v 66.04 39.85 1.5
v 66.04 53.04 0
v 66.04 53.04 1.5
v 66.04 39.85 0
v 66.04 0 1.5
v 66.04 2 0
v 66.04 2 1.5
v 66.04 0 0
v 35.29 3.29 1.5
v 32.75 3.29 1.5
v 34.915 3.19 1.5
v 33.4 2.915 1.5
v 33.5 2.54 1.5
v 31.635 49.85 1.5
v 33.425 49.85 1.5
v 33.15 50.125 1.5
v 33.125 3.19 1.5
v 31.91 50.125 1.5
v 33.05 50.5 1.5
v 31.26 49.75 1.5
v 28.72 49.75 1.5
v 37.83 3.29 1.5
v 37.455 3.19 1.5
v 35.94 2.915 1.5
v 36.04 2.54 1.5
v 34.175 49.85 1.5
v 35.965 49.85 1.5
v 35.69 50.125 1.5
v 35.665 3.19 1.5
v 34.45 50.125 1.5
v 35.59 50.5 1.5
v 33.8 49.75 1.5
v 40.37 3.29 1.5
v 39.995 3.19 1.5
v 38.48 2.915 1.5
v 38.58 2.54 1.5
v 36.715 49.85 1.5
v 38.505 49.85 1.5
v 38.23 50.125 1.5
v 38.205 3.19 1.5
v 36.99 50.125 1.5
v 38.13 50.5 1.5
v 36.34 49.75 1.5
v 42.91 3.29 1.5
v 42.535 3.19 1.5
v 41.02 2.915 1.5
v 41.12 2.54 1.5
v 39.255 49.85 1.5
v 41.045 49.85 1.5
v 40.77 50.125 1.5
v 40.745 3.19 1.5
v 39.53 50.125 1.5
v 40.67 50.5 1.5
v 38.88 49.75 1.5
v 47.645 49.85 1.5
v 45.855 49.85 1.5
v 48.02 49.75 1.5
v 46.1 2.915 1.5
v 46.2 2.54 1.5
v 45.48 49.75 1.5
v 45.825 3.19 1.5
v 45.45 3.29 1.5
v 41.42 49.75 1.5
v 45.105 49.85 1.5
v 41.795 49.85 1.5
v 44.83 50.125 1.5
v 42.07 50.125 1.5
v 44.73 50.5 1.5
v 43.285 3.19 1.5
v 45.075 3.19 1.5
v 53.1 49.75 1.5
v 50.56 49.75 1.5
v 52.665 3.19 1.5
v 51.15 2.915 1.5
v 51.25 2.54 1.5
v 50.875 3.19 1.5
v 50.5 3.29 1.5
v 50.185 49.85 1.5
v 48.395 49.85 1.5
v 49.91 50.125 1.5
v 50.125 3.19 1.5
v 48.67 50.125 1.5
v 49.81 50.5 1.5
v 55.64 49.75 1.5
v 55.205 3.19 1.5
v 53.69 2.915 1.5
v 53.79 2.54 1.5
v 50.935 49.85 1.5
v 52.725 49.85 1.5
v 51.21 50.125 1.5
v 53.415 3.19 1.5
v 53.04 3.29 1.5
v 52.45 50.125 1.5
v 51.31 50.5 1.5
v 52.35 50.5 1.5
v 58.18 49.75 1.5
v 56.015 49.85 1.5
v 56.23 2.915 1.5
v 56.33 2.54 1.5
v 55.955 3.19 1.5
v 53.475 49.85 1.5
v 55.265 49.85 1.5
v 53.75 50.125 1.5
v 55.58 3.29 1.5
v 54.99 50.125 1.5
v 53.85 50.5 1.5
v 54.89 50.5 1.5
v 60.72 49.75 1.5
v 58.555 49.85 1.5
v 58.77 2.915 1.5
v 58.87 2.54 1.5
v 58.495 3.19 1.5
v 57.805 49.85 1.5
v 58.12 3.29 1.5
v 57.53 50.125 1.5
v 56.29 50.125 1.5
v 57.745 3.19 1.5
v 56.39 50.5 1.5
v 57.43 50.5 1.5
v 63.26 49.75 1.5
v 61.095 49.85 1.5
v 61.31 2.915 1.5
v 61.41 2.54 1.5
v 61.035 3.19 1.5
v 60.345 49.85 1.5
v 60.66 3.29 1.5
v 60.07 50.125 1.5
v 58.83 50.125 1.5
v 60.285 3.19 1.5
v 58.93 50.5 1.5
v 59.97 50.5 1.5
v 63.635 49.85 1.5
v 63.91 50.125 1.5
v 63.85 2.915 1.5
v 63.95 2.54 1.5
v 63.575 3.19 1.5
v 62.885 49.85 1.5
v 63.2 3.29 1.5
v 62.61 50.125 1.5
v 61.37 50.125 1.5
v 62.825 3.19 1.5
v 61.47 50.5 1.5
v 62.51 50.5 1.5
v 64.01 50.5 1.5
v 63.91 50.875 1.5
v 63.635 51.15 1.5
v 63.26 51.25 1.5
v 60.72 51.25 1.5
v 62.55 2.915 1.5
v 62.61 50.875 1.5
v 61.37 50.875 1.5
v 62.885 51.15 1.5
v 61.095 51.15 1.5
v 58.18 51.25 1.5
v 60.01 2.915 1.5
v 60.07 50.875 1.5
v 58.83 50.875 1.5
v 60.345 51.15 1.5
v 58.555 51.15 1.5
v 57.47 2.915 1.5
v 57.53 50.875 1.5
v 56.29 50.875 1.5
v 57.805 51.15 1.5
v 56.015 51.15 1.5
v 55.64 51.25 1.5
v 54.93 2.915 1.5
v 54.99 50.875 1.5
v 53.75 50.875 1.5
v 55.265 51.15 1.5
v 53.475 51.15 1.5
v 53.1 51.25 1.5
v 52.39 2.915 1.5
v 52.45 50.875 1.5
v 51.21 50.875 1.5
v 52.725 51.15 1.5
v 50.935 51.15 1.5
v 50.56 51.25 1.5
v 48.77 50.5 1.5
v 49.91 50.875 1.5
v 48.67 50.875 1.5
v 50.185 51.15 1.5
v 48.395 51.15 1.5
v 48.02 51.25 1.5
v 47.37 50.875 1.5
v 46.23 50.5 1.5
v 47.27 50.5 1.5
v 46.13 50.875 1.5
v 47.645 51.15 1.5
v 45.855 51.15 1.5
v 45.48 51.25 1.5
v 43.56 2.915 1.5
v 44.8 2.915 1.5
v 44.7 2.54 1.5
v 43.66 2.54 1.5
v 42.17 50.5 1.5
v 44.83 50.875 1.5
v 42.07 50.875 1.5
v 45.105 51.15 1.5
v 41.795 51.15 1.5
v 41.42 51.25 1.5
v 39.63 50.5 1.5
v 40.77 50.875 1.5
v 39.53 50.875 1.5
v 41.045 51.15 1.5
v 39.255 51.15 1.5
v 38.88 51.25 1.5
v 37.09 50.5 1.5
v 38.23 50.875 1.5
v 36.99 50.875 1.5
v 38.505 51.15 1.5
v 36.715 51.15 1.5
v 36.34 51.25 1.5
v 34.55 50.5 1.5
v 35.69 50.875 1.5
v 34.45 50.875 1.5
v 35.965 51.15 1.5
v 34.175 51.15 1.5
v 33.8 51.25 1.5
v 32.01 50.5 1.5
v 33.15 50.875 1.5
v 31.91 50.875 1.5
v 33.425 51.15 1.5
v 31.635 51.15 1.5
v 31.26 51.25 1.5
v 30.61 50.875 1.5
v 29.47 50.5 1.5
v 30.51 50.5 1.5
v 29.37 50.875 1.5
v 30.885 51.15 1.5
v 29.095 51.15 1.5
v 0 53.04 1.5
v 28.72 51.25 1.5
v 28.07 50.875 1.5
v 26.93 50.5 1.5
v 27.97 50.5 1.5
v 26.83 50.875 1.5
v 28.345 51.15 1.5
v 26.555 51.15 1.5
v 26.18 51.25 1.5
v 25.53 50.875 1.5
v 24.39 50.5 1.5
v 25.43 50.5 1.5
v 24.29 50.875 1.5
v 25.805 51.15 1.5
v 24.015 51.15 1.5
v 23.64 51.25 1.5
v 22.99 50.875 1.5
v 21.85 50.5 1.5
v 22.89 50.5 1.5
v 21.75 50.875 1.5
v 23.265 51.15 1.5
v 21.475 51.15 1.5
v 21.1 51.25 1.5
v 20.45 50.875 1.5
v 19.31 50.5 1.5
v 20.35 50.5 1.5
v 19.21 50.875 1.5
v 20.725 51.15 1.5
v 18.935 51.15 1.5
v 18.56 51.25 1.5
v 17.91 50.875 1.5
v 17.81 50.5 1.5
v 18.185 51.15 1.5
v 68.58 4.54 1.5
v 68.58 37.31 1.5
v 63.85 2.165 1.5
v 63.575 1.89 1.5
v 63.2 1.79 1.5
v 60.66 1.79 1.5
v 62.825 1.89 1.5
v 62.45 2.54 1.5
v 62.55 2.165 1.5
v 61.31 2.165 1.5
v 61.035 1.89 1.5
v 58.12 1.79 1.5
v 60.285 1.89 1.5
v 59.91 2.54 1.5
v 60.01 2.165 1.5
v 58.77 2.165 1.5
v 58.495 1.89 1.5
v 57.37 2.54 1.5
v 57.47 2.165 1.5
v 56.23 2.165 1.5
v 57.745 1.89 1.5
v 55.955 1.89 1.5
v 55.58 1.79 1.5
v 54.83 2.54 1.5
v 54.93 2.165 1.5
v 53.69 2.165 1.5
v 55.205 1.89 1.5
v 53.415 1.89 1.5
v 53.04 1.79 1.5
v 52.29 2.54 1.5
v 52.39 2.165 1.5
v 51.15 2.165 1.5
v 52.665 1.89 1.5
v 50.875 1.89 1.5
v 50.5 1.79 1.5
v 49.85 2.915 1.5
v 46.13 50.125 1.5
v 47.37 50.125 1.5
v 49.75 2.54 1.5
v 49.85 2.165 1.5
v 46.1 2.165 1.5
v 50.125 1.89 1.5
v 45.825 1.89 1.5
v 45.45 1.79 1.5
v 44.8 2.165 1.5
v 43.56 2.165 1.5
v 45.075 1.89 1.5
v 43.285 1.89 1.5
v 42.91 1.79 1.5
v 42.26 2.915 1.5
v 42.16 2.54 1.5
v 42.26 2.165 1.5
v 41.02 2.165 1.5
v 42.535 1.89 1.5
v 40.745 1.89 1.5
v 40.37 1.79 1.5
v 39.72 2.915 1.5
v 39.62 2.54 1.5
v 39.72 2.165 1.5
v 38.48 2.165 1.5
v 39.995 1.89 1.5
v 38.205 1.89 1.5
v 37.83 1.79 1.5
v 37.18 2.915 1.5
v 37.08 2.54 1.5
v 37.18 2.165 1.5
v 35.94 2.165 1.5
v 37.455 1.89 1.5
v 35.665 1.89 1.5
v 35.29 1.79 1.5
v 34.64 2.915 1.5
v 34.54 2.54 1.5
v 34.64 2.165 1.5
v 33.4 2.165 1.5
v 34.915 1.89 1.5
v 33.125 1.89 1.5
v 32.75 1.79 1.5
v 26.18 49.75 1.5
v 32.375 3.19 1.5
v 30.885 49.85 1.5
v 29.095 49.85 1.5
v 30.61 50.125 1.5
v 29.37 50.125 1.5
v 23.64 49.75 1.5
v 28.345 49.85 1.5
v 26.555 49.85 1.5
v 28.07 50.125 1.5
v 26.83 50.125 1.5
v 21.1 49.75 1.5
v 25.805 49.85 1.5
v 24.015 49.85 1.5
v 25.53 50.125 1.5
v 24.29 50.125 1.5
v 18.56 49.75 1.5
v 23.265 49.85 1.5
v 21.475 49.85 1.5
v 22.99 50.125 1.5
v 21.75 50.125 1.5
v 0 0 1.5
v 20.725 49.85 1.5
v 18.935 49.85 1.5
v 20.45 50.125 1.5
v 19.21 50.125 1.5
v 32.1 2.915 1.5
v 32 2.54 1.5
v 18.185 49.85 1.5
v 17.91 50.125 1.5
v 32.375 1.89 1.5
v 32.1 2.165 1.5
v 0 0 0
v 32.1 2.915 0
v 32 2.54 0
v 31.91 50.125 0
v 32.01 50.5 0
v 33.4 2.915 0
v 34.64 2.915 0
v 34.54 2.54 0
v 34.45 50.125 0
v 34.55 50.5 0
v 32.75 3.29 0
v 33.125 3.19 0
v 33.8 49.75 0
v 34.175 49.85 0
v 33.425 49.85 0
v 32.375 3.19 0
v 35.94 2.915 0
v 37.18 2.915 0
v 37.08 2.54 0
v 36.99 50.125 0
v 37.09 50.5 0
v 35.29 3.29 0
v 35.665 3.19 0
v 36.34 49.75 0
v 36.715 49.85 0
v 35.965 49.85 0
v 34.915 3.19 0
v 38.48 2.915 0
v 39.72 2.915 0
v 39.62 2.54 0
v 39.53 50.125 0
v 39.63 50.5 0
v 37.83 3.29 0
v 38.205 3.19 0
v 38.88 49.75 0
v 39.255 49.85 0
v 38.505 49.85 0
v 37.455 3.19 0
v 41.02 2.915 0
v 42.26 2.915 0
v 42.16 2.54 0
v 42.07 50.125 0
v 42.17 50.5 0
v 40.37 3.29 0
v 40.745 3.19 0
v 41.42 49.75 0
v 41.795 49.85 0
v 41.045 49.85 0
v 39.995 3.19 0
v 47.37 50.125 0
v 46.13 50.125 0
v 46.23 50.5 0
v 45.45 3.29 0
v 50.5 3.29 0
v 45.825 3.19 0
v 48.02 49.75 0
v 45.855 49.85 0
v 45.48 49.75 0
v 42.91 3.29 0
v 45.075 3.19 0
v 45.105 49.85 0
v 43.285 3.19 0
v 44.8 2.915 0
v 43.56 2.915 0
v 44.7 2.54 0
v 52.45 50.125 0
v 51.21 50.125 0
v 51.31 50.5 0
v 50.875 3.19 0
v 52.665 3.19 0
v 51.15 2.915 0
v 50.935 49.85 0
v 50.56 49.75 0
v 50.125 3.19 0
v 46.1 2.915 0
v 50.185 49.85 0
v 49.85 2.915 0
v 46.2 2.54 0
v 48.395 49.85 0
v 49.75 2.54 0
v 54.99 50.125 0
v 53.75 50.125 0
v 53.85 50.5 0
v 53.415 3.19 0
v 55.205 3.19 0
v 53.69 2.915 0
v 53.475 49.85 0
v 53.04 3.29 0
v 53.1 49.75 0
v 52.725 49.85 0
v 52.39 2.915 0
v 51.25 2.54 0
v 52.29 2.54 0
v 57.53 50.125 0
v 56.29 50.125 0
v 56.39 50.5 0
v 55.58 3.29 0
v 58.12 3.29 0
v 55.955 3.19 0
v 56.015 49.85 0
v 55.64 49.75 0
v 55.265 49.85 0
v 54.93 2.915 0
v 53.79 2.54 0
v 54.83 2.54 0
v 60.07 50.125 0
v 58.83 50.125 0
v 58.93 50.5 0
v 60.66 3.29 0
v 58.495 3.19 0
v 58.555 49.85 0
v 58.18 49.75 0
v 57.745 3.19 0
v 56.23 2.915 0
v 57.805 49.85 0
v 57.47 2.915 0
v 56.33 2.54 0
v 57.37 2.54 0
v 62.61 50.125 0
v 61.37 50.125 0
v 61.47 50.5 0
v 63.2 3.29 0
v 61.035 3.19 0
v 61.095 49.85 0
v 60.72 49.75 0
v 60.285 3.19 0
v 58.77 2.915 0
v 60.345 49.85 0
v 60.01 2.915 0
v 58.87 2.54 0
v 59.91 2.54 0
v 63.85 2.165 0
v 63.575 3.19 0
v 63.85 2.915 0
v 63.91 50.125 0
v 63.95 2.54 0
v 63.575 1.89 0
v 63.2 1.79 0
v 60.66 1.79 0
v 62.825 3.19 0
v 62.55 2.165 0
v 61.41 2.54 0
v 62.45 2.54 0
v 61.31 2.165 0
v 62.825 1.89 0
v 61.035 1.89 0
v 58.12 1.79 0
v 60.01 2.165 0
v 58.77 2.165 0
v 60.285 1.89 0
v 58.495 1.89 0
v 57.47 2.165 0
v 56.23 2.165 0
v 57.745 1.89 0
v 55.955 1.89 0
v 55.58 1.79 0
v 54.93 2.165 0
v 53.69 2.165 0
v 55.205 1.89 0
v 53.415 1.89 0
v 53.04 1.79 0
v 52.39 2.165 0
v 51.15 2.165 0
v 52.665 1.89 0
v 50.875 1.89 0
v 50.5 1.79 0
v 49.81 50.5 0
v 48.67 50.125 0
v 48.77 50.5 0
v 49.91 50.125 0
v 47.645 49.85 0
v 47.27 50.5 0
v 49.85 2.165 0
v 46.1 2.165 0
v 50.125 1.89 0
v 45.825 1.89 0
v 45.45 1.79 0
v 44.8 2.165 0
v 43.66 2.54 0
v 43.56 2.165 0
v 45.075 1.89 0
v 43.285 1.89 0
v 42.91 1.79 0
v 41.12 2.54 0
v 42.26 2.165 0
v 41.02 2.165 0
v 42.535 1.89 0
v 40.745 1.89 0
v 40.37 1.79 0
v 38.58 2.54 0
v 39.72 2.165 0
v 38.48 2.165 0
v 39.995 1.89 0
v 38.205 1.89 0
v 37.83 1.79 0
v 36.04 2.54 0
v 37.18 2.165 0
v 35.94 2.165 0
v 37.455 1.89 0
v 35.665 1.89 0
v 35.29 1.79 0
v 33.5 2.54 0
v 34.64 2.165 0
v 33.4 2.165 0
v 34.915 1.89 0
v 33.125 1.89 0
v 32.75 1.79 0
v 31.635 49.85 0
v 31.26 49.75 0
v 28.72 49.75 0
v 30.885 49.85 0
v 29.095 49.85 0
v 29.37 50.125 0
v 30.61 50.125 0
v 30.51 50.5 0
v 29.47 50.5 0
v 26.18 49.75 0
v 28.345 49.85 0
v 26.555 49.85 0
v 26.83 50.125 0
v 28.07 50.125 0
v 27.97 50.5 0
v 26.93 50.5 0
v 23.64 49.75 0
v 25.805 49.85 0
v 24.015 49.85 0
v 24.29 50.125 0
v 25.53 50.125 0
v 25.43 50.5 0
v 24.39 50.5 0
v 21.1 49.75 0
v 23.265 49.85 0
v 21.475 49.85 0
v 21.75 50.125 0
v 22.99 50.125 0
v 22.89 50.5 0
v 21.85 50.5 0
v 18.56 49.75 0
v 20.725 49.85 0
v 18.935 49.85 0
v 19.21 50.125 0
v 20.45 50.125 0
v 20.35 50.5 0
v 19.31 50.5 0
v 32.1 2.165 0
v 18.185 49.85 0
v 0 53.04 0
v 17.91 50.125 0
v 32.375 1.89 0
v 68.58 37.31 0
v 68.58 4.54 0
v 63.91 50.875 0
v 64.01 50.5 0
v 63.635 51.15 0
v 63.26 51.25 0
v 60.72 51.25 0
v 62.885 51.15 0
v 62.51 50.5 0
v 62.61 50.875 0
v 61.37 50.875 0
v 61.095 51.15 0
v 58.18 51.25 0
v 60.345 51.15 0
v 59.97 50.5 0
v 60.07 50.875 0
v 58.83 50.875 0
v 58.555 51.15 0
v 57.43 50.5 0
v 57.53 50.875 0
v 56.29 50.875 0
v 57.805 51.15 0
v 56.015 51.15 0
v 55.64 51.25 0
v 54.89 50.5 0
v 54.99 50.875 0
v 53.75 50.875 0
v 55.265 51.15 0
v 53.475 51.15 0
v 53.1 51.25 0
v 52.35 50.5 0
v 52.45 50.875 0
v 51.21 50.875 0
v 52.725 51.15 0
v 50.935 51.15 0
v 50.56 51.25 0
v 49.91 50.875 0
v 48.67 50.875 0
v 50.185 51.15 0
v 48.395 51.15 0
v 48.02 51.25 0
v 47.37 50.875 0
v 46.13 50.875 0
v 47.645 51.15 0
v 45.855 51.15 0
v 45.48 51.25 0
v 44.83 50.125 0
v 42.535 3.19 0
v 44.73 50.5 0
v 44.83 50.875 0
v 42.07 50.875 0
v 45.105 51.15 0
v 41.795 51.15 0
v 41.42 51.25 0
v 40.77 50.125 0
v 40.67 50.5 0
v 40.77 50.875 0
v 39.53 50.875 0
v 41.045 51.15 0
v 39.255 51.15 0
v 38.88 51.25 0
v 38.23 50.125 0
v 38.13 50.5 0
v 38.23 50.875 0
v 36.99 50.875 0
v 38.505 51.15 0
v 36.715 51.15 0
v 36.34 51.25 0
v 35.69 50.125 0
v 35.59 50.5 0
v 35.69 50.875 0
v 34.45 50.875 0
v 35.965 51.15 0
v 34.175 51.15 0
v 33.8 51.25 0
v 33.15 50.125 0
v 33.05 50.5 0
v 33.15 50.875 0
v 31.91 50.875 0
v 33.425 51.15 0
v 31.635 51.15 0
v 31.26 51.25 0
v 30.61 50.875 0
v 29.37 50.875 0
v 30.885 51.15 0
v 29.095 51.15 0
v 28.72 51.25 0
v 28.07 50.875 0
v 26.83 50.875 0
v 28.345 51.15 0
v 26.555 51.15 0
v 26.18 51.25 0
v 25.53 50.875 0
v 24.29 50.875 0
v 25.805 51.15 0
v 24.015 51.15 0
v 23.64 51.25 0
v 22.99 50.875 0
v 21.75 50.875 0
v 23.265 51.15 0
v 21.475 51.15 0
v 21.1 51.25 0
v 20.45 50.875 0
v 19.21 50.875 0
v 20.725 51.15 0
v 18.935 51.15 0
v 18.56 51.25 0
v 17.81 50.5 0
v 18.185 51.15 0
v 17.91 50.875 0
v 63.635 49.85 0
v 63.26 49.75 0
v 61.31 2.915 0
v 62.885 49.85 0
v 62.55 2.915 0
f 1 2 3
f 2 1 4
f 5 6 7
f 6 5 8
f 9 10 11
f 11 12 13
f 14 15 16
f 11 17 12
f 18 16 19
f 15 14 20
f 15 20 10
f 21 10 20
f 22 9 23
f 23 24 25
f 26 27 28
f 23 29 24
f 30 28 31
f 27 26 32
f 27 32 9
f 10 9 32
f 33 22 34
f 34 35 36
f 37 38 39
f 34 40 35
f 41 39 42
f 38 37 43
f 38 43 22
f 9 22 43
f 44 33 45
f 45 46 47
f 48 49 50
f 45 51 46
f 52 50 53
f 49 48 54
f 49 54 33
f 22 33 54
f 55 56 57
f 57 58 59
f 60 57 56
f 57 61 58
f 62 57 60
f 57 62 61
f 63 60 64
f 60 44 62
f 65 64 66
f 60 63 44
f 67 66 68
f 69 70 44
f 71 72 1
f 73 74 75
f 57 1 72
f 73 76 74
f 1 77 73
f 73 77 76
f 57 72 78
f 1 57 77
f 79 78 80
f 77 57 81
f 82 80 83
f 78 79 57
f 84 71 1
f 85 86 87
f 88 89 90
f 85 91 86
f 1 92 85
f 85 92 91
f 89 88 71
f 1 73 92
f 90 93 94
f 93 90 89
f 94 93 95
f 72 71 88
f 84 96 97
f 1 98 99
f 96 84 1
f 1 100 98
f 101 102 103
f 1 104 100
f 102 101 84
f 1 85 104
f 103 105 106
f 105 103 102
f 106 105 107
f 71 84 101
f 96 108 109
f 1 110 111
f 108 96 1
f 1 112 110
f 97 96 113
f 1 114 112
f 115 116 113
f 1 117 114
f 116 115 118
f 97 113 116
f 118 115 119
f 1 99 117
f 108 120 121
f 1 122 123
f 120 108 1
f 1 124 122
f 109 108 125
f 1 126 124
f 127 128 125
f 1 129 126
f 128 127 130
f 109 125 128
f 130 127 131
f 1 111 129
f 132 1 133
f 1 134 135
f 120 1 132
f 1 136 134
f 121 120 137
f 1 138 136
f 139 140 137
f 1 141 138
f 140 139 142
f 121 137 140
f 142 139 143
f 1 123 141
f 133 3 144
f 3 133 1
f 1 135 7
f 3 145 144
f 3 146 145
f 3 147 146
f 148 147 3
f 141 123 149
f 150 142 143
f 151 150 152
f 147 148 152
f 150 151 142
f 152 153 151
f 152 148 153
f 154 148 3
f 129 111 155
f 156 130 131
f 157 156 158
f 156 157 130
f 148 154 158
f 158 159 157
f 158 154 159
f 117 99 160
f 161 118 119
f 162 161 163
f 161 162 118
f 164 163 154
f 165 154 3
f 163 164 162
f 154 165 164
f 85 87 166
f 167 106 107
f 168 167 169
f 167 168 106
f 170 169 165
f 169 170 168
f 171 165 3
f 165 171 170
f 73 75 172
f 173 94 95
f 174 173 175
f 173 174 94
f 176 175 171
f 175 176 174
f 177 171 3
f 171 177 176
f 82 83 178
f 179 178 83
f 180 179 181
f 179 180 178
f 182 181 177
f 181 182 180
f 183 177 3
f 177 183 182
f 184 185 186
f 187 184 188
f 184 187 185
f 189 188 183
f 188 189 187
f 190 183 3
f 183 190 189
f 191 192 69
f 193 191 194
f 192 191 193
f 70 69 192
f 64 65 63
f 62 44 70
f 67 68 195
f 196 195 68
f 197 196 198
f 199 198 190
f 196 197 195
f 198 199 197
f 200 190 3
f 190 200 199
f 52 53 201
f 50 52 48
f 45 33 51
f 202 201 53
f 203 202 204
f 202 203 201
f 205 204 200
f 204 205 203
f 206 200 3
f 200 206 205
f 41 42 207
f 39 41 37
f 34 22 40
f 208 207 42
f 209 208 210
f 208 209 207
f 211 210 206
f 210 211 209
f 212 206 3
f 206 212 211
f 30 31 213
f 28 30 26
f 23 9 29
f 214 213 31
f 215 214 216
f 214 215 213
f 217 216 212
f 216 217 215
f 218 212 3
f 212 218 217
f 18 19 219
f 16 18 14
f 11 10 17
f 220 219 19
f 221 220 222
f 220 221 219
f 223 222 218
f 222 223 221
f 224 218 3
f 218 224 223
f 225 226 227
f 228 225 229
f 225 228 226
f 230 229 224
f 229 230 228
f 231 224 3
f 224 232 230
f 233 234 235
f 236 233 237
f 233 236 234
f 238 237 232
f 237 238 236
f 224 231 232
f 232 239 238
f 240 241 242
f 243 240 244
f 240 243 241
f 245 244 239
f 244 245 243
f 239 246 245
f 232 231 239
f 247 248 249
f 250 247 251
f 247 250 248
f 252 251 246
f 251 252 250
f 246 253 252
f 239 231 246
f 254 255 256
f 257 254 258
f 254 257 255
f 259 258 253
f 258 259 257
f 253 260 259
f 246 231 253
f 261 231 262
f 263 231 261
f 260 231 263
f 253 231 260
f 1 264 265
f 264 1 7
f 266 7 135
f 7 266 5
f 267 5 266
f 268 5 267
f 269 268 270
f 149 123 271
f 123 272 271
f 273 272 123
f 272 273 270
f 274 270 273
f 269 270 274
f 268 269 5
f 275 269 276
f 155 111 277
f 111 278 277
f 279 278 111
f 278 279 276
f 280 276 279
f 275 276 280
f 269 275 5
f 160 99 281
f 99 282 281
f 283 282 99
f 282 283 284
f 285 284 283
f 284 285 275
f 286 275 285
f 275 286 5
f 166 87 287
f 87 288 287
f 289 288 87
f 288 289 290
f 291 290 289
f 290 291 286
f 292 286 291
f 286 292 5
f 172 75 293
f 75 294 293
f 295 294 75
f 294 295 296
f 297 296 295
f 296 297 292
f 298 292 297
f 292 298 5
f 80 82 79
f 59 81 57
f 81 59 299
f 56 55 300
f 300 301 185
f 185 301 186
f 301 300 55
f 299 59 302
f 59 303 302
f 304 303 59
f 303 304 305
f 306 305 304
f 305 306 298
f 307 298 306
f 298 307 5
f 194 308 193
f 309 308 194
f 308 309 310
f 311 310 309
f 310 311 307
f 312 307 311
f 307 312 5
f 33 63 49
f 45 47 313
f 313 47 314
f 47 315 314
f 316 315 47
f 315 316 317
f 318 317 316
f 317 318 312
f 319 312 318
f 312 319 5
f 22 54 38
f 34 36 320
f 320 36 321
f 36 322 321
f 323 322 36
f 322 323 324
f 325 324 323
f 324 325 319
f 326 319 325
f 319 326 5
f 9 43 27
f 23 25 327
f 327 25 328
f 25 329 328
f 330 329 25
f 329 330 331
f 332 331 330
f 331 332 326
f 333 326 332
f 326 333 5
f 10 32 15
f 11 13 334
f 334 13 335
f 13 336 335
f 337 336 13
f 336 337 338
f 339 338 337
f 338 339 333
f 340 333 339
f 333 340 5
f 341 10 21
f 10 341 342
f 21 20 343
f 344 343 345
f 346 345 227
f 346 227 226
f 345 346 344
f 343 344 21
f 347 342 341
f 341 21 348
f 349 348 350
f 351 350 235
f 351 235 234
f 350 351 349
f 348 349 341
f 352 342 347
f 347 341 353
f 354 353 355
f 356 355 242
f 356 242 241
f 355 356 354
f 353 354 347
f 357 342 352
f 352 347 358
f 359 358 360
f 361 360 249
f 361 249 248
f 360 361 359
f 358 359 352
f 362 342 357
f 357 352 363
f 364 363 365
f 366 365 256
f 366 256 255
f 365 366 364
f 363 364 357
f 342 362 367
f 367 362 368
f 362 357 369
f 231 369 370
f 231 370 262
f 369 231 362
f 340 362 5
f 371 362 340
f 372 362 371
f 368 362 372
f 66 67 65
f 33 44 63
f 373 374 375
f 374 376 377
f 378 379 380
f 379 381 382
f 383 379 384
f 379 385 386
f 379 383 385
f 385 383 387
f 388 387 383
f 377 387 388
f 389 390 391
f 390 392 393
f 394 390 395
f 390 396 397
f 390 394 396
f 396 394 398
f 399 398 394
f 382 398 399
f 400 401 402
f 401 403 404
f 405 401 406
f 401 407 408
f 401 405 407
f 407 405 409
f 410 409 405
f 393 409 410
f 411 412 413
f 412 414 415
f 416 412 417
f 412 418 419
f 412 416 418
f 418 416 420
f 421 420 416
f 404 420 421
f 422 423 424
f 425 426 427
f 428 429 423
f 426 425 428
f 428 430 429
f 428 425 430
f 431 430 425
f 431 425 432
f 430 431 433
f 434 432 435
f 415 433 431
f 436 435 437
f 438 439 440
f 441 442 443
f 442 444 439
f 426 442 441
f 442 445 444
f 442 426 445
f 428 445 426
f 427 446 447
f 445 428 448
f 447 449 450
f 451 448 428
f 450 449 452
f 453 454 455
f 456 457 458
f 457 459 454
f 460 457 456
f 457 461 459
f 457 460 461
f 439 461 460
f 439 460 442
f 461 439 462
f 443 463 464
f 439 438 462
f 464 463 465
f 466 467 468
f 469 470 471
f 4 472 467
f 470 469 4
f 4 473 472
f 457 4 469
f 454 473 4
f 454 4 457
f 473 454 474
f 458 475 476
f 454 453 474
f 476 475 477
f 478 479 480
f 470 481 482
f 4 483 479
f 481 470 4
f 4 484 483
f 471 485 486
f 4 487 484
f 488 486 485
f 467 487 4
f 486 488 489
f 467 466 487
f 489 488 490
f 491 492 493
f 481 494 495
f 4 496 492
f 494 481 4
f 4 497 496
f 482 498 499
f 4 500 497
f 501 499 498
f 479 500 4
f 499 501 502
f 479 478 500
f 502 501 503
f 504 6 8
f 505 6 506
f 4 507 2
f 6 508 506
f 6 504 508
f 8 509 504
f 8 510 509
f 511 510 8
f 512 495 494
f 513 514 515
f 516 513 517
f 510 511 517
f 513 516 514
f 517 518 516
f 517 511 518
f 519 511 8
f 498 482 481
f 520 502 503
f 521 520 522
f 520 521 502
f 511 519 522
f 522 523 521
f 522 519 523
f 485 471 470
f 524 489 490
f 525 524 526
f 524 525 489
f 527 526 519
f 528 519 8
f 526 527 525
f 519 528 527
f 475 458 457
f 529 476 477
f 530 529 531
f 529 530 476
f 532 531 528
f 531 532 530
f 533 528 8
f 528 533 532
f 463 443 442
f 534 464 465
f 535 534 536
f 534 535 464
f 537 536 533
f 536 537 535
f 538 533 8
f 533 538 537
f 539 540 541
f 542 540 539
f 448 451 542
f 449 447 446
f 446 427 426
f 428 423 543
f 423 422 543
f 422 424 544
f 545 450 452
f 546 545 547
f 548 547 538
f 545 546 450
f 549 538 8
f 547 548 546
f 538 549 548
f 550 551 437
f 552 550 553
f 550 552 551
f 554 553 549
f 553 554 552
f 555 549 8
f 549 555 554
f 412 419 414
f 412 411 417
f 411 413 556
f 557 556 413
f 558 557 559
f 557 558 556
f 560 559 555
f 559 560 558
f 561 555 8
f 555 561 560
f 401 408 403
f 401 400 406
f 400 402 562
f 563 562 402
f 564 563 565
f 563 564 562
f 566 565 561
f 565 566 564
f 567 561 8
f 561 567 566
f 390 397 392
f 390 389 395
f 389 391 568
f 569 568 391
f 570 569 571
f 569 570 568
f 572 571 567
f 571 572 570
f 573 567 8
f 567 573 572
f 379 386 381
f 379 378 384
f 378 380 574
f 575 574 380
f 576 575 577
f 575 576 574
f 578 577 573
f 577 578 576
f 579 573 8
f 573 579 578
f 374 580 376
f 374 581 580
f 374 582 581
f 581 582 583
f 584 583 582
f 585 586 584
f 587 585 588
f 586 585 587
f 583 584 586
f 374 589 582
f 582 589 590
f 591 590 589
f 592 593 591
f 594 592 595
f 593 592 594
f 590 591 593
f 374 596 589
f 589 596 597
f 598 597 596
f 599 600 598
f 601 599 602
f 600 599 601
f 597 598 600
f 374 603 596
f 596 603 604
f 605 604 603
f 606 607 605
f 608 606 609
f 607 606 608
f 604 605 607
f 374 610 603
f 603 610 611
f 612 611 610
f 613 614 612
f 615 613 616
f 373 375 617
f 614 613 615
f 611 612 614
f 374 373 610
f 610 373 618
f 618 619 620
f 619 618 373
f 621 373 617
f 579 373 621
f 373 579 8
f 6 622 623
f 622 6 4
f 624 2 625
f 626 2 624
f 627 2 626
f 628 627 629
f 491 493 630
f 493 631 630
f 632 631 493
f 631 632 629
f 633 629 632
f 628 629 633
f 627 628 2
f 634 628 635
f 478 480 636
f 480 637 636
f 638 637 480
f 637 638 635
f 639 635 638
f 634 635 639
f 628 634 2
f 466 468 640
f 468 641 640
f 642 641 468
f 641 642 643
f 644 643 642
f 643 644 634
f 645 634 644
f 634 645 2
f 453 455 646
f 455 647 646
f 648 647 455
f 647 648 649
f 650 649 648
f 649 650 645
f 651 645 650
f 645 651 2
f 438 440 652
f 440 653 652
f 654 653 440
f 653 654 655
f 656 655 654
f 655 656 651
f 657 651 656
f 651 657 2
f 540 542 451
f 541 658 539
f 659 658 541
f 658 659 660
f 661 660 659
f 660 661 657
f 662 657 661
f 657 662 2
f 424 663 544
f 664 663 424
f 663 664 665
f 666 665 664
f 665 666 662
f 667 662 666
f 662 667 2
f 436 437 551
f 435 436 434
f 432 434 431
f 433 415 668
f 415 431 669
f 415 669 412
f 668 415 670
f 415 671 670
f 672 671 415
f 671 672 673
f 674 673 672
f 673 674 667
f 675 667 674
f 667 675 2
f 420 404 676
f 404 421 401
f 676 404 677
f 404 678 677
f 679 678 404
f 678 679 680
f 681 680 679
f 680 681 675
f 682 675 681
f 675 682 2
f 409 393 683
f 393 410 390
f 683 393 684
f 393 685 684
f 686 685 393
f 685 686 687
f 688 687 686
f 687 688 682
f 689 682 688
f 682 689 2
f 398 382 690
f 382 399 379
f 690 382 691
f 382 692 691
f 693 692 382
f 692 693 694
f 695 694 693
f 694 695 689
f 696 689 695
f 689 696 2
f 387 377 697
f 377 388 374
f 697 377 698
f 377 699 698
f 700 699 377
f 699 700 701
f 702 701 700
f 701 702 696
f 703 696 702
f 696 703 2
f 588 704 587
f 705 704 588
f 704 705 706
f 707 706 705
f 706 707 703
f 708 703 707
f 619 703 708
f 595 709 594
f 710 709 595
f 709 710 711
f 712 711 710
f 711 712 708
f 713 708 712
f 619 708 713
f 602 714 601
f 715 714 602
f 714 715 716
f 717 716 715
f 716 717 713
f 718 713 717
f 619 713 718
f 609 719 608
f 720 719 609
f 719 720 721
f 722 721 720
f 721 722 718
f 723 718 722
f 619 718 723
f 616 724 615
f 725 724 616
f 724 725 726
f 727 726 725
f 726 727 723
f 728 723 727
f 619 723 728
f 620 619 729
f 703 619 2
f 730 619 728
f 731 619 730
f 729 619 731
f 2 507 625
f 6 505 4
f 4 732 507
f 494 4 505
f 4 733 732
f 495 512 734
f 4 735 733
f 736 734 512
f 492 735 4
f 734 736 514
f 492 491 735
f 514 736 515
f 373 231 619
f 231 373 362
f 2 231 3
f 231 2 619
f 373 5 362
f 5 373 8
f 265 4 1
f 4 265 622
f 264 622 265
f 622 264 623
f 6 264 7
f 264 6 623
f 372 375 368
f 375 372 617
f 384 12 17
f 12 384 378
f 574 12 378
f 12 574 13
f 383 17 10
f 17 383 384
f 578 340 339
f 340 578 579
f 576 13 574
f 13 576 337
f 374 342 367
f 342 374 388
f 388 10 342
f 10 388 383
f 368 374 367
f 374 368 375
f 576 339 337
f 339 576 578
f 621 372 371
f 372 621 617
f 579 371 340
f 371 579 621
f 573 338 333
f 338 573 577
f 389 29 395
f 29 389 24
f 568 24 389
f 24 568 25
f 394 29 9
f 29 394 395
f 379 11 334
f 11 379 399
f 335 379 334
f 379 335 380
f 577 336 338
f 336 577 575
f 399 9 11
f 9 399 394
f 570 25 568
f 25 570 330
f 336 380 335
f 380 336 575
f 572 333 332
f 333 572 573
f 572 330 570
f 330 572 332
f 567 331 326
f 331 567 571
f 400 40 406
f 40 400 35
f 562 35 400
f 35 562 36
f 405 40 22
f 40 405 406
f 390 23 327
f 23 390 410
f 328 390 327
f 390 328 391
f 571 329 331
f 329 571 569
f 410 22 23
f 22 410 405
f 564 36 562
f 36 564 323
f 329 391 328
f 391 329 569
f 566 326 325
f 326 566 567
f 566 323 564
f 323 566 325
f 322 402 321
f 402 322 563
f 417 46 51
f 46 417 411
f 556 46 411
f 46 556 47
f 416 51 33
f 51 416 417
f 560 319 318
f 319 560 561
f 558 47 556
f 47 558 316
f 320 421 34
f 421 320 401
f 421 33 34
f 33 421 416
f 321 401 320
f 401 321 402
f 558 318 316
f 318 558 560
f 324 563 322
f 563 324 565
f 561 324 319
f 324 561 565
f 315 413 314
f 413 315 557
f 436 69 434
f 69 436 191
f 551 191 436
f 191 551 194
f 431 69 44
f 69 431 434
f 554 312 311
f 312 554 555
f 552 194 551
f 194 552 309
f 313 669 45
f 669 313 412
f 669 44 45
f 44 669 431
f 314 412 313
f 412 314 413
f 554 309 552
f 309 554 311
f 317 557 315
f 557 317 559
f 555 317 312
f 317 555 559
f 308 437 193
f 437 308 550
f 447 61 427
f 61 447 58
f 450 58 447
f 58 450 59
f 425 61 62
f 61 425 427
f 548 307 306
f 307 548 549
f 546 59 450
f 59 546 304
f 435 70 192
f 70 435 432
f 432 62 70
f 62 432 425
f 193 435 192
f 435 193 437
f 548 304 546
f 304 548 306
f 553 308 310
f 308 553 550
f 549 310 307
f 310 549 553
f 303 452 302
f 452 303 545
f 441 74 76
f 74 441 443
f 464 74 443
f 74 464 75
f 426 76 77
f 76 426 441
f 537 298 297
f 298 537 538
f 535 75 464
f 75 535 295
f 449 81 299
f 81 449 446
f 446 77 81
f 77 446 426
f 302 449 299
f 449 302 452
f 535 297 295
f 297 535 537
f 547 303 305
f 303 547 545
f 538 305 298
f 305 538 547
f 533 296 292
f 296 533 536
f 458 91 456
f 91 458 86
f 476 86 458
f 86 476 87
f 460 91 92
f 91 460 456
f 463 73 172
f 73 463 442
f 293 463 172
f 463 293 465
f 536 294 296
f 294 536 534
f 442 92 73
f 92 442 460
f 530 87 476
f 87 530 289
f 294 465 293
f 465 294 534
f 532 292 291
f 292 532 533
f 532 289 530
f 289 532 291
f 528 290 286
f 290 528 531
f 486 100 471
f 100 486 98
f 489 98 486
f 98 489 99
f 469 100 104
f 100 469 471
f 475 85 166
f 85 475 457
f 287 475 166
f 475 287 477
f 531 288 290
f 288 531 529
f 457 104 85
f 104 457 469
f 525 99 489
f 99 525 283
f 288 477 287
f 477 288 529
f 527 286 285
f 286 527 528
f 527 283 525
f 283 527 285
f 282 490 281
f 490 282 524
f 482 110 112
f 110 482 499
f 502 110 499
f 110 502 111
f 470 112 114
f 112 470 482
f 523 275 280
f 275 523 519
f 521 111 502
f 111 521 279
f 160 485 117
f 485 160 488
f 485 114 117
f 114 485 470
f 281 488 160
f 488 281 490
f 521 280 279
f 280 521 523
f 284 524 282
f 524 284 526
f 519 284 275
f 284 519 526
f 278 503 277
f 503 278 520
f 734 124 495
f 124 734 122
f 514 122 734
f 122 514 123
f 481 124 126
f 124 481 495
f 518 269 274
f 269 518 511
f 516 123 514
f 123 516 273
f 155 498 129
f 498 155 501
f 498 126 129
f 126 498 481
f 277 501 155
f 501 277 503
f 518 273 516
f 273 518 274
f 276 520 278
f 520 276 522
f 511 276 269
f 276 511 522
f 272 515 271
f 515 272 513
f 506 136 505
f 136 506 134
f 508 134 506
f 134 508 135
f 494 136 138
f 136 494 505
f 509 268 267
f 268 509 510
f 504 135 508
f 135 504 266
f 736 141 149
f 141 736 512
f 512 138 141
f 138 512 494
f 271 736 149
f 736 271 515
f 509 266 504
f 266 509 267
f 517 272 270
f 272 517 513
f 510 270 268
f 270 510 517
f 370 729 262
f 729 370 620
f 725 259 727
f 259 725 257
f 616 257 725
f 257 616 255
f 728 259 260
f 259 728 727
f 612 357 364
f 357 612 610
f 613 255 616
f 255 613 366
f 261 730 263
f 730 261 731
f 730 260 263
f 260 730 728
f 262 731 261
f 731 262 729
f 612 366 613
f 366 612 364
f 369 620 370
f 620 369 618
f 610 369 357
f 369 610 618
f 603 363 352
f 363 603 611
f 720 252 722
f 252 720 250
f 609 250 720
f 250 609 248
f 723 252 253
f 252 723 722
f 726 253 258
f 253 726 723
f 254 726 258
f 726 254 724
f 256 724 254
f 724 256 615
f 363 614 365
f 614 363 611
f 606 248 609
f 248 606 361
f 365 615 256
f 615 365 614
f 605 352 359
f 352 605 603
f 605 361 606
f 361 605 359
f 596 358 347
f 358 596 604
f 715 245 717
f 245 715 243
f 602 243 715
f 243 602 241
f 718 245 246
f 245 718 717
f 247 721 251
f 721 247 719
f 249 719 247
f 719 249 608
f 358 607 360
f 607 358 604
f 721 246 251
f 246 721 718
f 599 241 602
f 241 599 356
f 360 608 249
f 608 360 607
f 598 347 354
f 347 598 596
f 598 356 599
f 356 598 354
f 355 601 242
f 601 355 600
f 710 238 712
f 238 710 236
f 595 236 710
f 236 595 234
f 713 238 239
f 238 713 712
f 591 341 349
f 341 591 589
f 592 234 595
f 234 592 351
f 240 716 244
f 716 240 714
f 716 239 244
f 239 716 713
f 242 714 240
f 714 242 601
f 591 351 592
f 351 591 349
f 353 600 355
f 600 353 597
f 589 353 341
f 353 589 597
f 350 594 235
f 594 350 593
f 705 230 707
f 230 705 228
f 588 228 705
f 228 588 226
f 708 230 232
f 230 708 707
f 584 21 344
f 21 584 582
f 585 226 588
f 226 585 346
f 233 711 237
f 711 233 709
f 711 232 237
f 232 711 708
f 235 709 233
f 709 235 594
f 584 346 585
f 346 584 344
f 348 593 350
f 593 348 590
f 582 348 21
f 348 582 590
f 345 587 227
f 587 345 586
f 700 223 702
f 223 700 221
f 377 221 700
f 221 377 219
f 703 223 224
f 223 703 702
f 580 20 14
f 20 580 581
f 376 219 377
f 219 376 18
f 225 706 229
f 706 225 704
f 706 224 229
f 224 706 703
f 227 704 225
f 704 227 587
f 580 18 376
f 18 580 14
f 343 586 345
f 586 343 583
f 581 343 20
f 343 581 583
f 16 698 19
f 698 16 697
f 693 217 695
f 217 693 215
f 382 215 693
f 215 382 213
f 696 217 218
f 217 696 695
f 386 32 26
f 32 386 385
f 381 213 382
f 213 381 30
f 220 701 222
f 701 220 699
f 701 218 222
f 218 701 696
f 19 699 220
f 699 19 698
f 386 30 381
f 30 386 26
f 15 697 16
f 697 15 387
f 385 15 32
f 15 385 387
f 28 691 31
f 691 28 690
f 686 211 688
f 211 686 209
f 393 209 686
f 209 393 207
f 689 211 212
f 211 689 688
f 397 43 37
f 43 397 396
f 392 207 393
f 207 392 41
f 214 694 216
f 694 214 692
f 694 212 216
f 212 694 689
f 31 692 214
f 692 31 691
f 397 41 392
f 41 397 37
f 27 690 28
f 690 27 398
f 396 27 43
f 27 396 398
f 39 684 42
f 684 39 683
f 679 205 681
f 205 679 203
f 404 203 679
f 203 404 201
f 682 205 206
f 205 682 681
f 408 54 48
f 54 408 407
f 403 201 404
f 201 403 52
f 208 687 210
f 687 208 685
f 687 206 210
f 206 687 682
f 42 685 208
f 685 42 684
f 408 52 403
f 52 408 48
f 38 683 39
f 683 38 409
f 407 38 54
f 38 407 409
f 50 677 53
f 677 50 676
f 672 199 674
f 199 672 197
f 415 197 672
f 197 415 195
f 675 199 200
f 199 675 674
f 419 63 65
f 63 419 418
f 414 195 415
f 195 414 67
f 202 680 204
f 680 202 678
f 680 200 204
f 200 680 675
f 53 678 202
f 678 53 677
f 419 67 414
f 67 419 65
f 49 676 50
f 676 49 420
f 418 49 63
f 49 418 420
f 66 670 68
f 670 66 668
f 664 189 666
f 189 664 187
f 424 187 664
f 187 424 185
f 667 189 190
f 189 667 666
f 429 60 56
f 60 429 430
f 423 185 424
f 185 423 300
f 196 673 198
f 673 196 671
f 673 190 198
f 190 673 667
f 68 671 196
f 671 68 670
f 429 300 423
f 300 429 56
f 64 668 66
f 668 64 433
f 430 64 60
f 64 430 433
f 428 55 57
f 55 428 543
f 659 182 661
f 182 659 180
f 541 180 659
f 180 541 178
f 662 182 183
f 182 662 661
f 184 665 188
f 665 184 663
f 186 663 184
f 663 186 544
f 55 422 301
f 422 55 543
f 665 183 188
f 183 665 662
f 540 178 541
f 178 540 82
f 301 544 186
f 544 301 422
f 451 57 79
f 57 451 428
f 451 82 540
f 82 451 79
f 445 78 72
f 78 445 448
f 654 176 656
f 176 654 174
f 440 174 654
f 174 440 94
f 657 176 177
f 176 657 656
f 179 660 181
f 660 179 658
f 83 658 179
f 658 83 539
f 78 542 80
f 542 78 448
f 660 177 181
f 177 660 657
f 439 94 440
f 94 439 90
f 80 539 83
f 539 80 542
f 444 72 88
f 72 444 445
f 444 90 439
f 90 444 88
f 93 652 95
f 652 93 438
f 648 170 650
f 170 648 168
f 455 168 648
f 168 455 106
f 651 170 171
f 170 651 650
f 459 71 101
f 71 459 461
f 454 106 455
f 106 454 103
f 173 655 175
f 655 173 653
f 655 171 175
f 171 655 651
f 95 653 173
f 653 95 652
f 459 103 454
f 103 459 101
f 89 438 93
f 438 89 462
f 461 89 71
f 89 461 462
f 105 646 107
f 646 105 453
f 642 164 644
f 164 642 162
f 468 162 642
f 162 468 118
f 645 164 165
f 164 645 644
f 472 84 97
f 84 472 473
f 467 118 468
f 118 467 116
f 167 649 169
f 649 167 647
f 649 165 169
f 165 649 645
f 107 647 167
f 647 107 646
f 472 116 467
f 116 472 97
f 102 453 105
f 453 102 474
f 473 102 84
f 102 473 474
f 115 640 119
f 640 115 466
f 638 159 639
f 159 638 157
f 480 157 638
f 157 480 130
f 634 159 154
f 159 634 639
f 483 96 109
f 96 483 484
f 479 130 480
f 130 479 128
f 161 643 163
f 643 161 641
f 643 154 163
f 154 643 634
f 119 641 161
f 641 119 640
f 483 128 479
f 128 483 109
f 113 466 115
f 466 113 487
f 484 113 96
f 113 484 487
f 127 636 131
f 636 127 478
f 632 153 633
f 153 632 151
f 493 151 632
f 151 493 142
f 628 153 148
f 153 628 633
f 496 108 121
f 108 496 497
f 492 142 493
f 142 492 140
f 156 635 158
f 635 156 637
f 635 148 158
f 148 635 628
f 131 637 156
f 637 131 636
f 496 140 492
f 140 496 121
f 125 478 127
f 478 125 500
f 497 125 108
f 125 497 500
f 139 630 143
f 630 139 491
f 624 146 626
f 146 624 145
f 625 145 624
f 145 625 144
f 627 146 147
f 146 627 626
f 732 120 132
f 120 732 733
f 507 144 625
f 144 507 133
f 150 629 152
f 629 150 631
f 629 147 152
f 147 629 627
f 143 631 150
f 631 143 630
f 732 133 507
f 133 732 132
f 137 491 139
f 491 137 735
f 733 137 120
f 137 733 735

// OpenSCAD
shield_UNO(1.5);

module shield_UNO(h){
difference(){
union(){
cube([66.04,50.5+2.54,h]);
translate([65.04,2,0])hull(){
cube([1,37.85,h]);
translate([1,2.54,0])cube([2.54,32.77,h]);
}
}
$fn=12;
translate([32.75,2.54,-1])pin20mil(6,1.5,h+2);
translate([50.5,2.54,-1])pin20mil(6,1.5,h+2);
translate([18.56,50.5,-1])pin20mil(10,1.5,h+2);
translate([45.48,50.5,-1])pin20mil(8,1.5,h+2);
}
}

module pin20mil(n,d_paso,h_paso)
{
for (i=[1:n]){
     translate([(i-1)*2.54,0,0])cylinder(d=d_paso,h=h_paso,$fn=12);
}
}
